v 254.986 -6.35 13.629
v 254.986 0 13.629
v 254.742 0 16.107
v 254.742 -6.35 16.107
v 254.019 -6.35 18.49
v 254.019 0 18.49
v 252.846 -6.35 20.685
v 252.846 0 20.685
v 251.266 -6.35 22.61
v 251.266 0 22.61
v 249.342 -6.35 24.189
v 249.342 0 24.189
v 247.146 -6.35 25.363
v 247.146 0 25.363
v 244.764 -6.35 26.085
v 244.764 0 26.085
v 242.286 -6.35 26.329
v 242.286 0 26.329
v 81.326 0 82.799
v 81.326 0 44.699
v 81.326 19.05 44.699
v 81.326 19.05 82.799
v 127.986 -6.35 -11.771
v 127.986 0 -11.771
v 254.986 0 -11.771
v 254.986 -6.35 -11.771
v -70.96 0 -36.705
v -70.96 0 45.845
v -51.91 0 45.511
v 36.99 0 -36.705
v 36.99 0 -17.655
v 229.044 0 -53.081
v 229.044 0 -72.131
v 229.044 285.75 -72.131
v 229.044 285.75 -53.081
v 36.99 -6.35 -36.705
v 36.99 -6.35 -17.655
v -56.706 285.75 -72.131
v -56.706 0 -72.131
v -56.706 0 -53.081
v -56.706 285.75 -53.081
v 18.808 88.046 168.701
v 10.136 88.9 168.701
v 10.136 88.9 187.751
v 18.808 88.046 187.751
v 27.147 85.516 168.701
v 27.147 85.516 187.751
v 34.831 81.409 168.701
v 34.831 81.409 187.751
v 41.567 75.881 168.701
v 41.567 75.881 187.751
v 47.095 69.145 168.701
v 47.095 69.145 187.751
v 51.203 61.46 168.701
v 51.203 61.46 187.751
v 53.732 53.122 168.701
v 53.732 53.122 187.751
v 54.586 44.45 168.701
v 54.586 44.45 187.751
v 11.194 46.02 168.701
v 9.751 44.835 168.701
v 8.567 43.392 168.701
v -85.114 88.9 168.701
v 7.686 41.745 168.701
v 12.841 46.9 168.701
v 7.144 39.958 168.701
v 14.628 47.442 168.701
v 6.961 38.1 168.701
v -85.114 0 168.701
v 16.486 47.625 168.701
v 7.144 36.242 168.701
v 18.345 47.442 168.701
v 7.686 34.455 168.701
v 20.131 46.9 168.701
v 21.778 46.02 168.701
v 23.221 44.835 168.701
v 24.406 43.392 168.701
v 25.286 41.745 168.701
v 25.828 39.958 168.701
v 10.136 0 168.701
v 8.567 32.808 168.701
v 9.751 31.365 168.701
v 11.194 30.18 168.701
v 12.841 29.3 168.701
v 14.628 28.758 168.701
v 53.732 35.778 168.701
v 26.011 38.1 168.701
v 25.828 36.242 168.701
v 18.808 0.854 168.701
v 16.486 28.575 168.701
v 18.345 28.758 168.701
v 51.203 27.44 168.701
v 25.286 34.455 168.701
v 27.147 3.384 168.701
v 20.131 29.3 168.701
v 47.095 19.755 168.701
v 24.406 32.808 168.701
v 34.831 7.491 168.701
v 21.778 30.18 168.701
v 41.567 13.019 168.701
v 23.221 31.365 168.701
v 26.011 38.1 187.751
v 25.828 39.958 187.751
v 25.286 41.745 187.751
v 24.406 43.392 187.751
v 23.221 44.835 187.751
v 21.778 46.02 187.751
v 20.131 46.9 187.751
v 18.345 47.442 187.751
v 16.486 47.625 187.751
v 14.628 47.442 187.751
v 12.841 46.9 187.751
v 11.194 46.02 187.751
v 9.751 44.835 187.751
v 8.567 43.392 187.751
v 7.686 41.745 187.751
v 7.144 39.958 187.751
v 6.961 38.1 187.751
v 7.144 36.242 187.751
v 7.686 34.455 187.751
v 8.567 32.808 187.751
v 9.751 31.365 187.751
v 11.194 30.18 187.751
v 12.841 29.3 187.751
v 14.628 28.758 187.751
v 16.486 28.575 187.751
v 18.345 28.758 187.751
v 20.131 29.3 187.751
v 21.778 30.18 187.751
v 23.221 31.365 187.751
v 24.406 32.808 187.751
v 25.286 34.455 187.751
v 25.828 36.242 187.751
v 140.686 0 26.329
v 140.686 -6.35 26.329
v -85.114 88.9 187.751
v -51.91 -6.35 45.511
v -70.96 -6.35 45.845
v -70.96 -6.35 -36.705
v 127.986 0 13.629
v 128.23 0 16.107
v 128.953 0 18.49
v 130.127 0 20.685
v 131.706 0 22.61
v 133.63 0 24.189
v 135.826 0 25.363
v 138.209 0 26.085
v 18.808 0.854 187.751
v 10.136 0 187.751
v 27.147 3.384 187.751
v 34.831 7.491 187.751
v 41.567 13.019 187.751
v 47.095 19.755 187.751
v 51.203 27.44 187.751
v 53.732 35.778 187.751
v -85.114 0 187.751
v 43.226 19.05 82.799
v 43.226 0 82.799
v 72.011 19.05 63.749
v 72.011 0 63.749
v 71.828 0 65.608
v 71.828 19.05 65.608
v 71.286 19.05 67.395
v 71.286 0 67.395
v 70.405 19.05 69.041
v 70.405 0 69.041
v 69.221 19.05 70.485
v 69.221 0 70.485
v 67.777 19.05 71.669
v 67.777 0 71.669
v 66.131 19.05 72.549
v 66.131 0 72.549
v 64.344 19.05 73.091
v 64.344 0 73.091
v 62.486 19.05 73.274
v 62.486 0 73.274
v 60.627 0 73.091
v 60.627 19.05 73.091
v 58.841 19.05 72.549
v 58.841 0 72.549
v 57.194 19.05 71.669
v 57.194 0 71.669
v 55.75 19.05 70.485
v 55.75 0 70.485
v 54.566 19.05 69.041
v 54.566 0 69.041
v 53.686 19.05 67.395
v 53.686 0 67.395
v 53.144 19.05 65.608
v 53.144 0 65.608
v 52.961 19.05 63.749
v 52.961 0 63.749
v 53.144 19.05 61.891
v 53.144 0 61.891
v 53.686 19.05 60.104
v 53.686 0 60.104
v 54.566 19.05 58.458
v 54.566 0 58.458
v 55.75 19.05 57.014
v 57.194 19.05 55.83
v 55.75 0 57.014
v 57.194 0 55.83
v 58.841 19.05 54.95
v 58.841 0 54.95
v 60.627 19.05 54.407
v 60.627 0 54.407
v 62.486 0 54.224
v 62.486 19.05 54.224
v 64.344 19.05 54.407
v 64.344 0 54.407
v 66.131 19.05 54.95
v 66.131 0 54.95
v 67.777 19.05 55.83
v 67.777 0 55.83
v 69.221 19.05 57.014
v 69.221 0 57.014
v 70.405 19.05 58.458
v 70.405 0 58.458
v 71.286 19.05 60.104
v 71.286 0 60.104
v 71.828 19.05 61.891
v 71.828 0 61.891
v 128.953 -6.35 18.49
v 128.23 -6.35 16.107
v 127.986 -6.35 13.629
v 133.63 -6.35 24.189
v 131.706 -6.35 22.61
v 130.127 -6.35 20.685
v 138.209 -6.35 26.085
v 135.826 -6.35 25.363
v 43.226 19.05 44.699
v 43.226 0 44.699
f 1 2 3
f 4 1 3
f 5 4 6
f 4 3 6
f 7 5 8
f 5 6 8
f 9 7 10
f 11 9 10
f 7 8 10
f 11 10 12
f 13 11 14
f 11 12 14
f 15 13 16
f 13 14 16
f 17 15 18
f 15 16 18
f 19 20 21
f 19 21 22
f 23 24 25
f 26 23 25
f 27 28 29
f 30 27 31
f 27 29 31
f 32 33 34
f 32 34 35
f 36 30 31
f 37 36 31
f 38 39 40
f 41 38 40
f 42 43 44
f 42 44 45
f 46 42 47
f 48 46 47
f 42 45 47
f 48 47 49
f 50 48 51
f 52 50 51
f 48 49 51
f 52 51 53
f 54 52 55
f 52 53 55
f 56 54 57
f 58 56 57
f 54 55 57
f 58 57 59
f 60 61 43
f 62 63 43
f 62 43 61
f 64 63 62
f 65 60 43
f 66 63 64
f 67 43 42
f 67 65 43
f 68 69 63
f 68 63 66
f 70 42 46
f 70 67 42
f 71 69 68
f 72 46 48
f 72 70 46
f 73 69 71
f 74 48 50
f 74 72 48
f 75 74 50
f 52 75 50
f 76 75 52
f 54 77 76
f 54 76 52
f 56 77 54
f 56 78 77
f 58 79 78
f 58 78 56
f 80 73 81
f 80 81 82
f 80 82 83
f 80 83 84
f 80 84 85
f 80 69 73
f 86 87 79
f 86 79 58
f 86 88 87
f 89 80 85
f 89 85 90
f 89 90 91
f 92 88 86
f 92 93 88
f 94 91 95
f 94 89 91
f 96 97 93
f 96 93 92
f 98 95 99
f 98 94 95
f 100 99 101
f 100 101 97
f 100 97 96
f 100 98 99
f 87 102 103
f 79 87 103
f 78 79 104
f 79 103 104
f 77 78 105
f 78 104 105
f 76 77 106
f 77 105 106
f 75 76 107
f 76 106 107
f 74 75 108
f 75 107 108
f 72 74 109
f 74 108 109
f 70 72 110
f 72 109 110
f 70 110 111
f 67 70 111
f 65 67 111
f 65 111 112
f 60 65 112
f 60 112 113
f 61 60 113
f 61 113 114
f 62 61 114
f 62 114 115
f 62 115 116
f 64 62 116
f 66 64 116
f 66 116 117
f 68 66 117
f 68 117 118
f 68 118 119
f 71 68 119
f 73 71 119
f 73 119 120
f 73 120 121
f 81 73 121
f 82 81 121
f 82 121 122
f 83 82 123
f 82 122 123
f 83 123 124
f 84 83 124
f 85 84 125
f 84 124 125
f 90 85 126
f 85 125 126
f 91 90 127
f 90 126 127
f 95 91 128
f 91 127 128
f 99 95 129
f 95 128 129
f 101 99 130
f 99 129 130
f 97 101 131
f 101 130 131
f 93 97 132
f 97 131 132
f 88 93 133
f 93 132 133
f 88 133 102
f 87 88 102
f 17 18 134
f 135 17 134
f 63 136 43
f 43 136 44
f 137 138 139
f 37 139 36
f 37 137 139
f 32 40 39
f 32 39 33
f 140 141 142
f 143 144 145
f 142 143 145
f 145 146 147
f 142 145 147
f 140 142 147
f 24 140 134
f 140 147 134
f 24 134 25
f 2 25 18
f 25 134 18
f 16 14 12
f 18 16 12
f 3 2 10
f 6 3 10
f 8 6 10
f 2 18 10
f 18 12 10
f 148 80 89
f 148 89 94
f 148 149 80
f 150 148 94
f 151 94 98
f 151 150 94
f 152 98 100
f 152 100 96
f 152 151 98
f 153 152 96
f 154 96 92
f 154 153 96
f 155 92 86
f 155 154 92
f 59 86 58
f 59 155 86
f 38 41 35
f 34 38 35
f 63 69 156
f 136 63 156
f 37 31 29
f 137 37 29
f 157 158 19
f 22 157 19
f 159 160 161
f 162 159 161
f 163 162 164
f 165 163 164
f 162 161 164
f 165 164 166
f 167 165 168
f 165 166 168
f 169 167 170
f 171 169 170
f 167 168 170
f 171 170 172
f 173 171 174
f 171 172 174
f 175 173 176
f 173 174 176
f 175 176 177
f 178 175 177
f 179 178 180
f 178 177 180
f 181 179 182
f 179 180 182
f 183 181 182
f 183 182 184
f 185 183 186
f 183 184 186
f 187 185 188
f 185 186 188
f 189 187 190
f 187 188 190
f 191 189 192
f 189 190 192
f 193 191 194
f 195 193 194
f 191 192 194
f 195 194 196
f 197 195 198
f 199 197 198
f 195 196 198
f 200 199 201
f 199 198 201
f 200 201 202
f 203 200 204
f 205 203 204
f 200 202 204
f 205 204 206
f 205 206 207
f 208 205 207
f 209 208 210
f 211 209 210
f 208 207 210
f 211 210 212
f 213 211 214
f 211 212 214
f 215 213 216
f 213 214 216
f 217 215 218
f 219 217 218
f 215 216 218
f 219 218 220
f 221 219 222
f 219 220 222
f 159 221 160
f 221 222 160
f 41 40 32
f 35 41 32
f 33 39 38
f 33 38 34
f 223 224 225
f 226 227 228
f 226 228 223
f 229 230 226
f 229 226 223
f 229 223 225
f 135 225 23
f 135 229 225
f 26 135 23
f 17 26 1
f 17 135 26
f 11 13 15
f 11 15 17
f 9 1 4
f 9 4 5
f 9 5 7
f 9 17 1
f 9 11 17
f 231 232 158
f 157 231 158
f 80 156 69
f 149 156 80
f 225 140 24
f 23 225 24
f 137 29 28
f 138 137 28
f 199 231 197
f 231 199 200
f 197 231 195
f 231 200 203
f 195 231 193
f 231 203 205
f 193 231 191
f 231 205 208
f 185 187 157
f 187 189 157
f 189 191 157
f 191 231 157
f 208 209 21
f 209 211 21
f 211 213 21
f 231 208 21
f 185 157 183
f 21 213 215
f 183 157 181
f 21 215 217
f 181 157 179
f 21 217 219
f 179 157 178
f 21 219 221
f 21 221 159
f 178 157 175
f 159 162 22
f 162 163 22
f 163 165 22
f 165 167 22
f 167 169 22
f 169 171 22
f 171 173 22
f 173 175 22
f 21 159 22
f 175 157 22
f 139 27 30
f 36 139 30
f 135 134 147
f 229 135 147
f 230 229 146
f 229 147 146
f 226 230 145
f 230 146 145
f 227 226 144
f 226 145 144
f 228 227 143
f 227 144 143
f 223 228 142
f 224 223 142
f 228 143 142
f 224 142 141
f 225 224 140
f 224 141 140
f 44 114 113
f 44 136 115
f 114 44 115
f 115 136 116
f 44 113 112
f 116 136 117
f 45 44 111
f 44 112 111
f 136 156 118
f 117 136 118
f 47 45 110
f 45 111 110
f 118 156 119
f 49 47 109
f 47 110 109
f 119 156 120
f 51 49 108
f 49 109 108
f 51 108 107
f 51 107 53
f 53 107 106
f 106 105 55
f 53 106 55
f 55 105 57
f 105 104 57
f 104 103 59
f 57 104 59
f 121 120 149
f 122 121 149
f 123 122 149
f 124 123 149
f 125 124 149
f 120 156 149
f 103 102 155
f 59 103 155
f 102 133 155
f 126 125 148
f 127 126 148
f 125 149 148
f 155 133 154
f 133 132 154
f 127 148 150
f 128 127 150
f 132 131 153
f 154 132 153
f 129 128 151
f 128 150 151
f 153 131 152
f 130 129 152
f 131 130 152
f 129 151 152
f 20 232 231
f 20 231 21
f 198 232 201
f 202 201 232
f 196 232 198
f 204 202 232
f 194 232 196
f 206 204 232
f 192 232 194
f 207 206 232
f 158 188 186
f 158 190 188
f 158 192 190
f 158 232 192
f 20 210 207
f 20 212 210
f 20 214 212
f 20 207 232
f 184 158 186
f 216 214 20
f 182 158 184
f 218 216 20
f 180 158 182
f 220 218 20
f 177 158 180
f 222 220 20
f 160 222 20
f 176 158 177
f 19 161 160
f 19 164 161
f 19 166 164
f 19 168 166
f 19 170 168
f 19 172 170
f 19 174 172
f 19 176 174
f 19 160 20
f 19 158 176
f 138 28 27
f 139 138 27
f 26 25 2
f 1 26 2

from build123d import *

# Parameters (mm, degrees)
F1_DEPTH = 6.35
F2_W     = 285.75
F2_H     = 19.05
F3_DEPTH = 285.75
F4_W     = 38.1
F4_H     = 38.1
F4_R     = 9.525
F5_DEPTH = 19.05
F6_W     = 139.7
F6_H     = 19.05
F7_DEPTH = 88.9
F8_R     = 9.525
F9_DEPTH = 76.2
F10_R    = 44.44999


# Not quite as in the source:
# - a fillet or chamfer is up to 0.001 mm smaller than in the source, because OpenCascade refuses the exact size


with BuildPart() as f1:
    # F0 (on Front) → F1 (new body)
    with BuildSketch(Plane.XZ):
        Polygon((-51.910363327, 45.5110752996), (-70.960363327, 45.8452826373), (-70.960363327, -36.7047173627), (36.989636673, -36.7047173627), (36.989636673, -17.6547173627), align=None)
    extrude(amount=F1_DEPTH)


with BuildPart() as f1b:
    # F0 (on Front) → F1, piece 2 (new body)
    with BuildSketch(Plane.XZ):
        with BuildLine():
            ThreePointArc((140.6862076044, 26.3294414565), (131.7059514833, 22.6096975776), (127.9862076044, 13.6294414565))
            Line((127.9862076044, 13.6294414565), (127.9862076044, -11.7705585435))
            Line((127.9862076044, -11.7705585435), (254.9862076044, -11.7705585435))
            Line((254.9862076044, -11.7705585435), (254.9862076044, 13.6294414565))
            ThreePointArc((254.9862076044, 13.6294414565), (251.2664637255, 22.6096975776), (242.2862076044, 26.3294414565))
            Line((242.2862076044, 26.3294414565), (140.6862076044, 26.3294414565))
        make_face()
    extrude(amount=F1_DEPTH)


with BuildPart() as f3:
    # F2 (on Front) → F3 (new body)
    with BuildSketch(Plane.XZ):
        with Locations((86.1693803481, -62.6063495874)):
            Rectangle(F2_W, F2_H)
    extrude(amount=-F3_DEPTH)


with BuildPart() as f5:
    # F4 (on Front) → F5 (new body)
    with BuildSketch(Plane.XZ):
        with Locations((62.2761137784, 63.7494698803)):
            Rectangle(F4_W, F4_H)
        with Locations((62.4856501818, 63.7494698803)):
            Circle(F4_R, mode=Mode.SUBTRACT)
    extrude(amount=-F5_DEPTH)


with BuildPart() as f7:
    # F6 (on Front) → F7 (new body)
    with BuildSketch(Plane.XZ):
        with Locations((-15.2637315914, 178.2262056568)):
            Rectangle(F6_W, F6_H)
    extrude(amount=-F7_DEPTH)

    # F8 (on face) → F9 (cut)
    with BuildSketch(Plane.XY.offset(187.7512056568)):
        with Locations((16.4862684086, 38.1)):
            Circle(F8_R)
    extrude(amount=-F9_DEPTH, mode=Mode.SUBTRACT)

    # F10 (radius 44.45 in the source; OpenCascade refuses exactly that, so slightly less here)
    f10_edges = [f7.edges().sort_by_distance(p)[0] for p in [
        (54.586268, 0, 178.226206),
        (54.586268, 88.9, 178.226206),
    ]]
    fillet(f10_edges, radius=F10_R)


solid = Compound([f1.part, f1b.part, f3.part, f5.part, f7.part])
